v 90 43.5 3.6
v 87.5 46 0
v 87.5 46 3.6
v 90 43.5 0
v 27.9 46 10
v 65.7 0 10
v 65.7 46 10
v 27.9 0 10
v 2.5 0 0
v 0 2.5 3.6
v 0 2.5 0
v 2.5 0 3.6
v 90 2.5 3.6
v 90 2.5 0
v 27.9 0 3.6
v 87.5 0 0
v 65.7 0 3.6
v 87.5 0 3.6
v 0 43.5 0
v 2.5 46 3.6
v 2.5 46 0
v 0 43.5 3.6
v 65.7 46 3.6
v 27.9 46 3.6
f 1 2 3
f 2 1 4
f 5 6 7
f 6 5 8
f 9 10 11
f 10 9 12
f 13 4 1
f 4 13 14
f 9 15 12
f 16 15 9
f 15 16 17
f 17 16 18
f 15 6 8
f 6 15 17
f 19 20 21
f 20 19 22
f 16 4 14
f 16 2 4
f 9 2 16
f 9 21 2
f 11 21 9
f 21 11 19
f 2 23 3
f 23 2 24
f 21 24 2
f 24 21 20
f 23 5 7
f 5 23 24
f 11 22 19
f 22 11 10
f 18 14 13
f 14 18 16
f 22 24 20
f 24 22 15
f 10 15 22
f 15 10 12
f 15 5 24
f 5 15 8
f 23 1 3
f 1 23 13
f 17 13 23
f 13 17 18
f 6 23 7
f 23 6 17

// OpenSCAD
$fn = 32;

// ----------------------------------------------------------------------
// Stepped bar: centerstep, 90 x 46 x 10/3.6 mm
// ----------------------------------------------------------------------

// --- parameters (mm) ---
bar_l = 90;               // bar length, X
bar_w = 46;               // bar width, Y
plate_t = 10;             // thickness of the thick zone, Z
thin_t = 3.6;             // thickness of the thin zone
corner_c = 2.5;           // corner chamfer of the bar
step_cut = 6.4;           // material removed from the thin zone
thick_from = 27.9;        // start of the thick middle zone
thick_to = 65.7;          // end of the thick middle zone
depth_1 = 6.4;            // depth of cut 1 from the top face
depth_2 = 6.4;            // depth of cut 2 from the top face

profile = [[2.5, 0], [87.5, 0], [90, 2.5], [90, 43.5], [87.5, 46], [2.5, 46], [0, 43.5], [0, 2.5]];  // primary outline, 8 points, counter clockwise
void_1 = [[-1, -1], [27.9, -1], [27.9, 47], [-1, 47]];  // thin left end, 4 points
void_2 = [[65.7, -1], [91, -1], [91, 47], [65.7, 47]];  // thin right end, 4 points

// --- the one profile operation ---
difference() {
  linear_extrude(height = plate_t) polygon(points = profile);
  translate([0, 0, plate_t - depth_1])
    linear_extrude(height = depth_1 + 1) polygon(points = void_1);
  translate([0, 0, plate_t - depth_2])
    linear_extrude(height = depth_2 + 1) polygon(points = void_2);
}
